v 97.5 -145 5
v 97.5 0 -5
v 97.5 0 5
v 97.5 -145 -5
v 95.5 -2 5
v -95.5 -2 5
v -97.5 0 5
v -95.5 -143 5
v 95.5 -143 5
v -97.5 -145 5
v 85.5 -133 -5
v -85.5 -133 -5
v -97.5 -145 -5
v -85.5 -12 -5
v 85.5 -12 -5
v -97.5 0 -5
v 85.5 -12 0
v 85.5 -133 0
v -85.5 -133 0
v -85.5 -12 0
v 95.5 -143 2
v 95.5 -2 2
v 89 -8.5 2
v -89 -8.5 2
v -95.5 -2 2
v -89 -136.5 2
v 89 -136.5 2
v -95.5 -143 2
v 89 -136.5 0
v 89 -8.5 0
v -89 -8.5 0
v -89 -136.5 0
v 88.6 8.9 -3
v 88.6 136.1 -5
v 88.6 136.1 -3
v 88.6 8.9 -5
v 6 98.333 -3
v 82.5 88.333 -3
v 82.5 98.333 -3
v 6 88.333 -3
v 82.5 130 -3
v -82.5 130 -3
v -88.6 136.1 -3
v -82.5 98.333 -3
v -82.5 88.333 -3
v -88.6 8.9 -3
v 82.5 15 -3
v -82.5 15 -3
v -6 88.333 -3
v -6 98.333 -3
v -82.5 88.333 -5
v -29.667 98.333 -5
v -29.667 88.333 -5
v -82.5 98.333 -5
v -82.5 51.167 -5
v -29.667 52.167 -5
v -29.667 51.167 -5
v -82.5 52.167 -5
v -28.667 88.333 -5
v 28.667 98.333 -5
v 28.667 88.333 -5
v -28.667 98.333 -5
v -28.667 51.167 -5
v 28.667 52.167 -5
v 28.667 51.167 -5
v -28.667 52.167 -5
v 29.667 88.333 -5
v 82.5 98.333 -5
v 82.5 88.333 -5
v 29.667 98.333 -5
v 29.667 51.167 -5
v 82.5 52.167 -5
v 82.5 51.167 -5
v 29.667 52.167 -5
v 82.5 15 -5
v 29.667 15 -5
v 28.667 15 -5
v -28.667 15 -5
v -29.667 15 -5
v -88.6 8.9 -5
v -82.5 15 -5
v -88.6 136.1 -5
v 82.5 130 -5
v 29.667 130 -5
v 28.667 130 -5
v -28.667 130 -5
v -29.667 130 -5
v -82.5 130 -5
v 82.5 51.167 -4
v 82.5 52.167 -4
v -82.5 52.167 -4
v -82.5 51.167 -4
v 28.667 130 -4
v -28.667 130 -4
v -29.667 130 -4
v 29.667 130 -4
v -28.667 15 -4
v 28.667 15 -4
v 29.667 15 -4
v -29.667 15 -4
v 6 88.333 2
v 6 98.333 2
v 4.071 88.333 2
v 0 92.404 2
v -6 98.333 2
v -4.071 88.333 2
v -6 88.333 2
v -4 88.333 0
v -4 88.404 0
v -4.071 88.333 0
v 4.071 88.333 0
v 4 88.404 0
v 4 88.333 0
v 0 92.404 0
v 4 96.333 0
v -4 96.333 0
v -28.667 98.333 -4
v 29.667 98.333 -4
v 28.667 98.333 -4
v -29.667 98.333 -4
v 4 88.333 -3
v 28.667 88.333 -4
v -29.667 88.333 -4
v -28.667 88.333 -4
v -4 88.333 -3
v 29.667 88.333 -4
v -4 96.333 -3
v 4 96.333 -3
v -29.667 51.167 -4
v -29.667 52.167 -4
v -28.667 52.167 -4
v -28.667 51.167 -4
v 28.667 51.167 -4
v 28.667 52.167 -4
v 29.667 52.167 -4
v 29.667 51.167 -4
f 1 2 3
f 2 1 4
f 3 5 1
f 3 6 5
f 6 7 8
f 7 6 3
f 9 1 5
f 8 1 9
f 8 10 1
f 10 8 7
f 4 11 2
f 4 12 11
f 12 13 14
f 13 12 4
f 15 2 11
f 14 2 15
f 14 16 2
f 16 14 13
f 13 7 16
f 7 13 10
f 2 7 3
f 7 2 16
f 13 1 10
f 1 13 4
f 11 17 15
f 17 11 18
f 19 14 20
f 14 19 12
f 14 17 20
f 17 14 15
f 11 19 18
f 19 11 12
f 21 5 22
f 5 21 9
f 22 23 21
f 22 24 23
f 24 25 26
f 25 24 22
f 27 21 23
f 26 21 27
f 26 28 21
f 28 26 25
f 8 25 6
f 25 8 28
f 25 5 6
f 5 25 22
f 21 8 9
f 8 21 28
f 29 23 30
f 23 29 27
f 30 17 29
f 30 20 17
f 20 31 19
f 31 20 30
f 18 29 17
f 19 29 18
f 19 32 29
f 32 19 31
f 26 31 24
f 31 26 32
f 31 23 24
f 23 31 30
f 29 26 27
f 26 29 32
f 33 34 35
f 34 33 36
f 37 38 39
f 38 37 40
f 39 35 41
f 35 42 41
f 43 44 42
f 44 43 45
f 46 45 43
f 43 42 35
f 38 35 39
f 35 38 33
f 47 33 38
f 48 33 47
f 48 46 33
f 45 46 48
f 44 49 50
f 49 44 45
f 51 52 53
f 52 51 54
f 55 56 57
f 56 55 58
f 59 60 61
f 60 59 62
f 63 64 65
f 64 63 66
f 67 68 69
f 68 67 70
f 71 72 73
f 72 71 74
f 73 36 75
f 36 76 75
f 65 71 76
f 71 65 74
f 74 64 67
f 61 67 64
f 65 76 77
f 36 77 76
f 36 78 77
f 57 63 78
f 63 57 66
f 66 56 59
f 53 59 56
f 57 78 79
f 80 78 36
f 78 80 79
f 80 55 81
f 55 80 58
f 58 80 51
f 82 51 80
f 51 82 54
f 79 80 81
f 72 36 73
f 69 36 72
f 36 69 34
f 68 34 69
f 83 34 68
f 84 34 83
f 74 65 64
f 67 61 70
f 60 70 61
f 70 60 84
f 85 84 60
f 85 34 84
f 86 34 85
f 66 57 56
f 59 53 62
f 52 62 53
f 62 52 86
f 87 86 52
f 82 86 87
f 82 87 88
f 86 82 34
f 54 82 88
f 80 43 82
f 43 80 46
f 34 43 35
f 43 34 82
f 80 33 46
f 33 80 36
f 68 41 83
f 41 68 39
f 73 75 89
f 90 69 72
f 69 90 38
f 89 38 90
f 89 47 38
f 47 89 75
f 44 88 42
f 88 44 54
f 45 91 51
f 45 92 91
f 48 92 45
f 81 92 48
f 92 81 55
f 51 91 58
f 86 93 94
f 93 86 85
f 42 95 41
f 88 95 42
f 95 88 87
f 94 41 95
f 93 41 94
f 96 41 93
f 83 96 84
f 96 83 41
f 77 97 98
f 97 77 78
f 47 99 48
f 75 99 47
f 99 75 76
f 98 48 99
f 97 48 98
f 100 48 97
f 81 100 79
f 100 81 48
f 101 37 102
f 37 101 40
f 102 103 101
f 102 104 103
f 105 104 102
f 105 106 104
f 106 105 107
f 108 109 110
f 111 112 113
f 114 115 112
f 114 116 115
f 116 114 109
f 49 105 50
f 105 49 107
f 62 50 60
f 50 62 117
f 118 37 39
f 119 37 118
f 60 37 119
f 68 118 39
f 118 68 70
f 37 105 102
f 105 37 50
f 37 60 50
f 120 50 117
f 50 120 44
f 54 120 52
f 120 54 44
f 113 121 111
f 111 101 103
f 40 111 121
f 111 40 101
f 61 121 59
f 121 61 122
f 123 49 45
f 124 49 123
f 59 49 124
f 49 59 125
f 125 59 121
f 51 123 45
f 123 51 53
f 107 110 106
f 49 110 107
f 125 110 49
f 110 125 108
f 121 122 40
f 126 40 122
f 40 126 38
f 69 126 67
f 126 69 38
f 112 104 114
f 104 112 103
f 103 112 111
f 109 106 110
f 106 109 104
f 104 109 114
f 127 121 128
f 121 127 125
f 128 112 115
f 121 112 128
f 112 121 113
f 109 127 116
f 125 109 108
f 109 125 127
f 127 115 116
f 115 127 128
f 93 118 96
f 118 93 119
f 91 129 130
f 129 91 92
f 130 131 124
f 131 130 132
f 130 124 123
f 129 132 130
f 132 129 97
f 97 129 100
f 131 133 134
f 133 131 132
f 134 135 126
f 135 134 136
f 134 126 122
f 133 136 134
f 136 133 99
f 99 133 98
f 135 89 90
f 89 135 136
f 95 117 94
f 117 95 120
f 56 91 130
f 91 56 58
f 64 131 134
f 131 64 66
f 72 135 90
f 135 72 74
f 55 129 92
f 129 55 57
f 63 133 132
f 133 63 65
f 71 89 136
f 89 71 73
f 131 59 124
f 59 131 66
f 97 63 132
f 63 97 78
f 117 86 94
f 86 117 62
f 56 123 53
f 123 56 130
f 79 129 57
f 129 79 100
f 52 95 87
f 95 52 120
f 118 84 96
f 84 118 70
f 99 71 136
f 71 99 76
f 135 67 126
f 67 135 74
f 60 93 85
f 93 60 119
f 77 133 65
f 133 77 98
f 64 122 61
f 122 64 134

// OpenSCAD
all(175,125);
//all(150,150);


module all(w,h) {
    if(w <= h) {
        translate([-w/2-10,0,0])
        frame(w,h);
        translate([w/2+10,0,0])
        back(w,h);
    } else {
        translate([0,-h/2-10,0])
        frame(w,h);
        translate([0,h/2+10,0])
        back(w,h);

    }
}    

module frame(w,h) {
    difference() {
        cube([w+20,h+20,10], center=true);
        cube([w-4,h-4,12], center=true);
        translate([0,0,4])
        cube([w+16,h+16,4], center=true);
        translate([0,0,4])
        cube([w+3,h+3,8], center=true);
    }
}

module back(w,h) {
    translate([0,0,-4.0])
    union() {
        difference() {
            cube([w+2.2,h+2.2,2], center=true);
            translate([0,0,0])
            cube([w-10,h-10,3], center=true);
        }
        translate([0,h/6,0])
        union() {
            cube([w-5,10,2], center=true);
            
            translate([0,0,5])
            difference() {
                cube([12,10,2], center=true);
                    translate([0,-8,0])
                rotate([0,0,45])
                cube([10,10,4], center=true);
            }
            
            translate([0,0,2.5])
            difference() {
                cube([12,10,3], center=true);
                translate([0,-2,0])
                cube([8,10,3.1], center=true);
            }
        }
        translate([0,-h/6,-0.5])
        cube([w-5,1,1], center=true);
        
        translate([-w/6,0,-0.5])
        cube([1,h-5,1], center=true);
        
        translate([w/6,0,-0.5])
        cube([1,h-5,1], center=true);
    }
}
